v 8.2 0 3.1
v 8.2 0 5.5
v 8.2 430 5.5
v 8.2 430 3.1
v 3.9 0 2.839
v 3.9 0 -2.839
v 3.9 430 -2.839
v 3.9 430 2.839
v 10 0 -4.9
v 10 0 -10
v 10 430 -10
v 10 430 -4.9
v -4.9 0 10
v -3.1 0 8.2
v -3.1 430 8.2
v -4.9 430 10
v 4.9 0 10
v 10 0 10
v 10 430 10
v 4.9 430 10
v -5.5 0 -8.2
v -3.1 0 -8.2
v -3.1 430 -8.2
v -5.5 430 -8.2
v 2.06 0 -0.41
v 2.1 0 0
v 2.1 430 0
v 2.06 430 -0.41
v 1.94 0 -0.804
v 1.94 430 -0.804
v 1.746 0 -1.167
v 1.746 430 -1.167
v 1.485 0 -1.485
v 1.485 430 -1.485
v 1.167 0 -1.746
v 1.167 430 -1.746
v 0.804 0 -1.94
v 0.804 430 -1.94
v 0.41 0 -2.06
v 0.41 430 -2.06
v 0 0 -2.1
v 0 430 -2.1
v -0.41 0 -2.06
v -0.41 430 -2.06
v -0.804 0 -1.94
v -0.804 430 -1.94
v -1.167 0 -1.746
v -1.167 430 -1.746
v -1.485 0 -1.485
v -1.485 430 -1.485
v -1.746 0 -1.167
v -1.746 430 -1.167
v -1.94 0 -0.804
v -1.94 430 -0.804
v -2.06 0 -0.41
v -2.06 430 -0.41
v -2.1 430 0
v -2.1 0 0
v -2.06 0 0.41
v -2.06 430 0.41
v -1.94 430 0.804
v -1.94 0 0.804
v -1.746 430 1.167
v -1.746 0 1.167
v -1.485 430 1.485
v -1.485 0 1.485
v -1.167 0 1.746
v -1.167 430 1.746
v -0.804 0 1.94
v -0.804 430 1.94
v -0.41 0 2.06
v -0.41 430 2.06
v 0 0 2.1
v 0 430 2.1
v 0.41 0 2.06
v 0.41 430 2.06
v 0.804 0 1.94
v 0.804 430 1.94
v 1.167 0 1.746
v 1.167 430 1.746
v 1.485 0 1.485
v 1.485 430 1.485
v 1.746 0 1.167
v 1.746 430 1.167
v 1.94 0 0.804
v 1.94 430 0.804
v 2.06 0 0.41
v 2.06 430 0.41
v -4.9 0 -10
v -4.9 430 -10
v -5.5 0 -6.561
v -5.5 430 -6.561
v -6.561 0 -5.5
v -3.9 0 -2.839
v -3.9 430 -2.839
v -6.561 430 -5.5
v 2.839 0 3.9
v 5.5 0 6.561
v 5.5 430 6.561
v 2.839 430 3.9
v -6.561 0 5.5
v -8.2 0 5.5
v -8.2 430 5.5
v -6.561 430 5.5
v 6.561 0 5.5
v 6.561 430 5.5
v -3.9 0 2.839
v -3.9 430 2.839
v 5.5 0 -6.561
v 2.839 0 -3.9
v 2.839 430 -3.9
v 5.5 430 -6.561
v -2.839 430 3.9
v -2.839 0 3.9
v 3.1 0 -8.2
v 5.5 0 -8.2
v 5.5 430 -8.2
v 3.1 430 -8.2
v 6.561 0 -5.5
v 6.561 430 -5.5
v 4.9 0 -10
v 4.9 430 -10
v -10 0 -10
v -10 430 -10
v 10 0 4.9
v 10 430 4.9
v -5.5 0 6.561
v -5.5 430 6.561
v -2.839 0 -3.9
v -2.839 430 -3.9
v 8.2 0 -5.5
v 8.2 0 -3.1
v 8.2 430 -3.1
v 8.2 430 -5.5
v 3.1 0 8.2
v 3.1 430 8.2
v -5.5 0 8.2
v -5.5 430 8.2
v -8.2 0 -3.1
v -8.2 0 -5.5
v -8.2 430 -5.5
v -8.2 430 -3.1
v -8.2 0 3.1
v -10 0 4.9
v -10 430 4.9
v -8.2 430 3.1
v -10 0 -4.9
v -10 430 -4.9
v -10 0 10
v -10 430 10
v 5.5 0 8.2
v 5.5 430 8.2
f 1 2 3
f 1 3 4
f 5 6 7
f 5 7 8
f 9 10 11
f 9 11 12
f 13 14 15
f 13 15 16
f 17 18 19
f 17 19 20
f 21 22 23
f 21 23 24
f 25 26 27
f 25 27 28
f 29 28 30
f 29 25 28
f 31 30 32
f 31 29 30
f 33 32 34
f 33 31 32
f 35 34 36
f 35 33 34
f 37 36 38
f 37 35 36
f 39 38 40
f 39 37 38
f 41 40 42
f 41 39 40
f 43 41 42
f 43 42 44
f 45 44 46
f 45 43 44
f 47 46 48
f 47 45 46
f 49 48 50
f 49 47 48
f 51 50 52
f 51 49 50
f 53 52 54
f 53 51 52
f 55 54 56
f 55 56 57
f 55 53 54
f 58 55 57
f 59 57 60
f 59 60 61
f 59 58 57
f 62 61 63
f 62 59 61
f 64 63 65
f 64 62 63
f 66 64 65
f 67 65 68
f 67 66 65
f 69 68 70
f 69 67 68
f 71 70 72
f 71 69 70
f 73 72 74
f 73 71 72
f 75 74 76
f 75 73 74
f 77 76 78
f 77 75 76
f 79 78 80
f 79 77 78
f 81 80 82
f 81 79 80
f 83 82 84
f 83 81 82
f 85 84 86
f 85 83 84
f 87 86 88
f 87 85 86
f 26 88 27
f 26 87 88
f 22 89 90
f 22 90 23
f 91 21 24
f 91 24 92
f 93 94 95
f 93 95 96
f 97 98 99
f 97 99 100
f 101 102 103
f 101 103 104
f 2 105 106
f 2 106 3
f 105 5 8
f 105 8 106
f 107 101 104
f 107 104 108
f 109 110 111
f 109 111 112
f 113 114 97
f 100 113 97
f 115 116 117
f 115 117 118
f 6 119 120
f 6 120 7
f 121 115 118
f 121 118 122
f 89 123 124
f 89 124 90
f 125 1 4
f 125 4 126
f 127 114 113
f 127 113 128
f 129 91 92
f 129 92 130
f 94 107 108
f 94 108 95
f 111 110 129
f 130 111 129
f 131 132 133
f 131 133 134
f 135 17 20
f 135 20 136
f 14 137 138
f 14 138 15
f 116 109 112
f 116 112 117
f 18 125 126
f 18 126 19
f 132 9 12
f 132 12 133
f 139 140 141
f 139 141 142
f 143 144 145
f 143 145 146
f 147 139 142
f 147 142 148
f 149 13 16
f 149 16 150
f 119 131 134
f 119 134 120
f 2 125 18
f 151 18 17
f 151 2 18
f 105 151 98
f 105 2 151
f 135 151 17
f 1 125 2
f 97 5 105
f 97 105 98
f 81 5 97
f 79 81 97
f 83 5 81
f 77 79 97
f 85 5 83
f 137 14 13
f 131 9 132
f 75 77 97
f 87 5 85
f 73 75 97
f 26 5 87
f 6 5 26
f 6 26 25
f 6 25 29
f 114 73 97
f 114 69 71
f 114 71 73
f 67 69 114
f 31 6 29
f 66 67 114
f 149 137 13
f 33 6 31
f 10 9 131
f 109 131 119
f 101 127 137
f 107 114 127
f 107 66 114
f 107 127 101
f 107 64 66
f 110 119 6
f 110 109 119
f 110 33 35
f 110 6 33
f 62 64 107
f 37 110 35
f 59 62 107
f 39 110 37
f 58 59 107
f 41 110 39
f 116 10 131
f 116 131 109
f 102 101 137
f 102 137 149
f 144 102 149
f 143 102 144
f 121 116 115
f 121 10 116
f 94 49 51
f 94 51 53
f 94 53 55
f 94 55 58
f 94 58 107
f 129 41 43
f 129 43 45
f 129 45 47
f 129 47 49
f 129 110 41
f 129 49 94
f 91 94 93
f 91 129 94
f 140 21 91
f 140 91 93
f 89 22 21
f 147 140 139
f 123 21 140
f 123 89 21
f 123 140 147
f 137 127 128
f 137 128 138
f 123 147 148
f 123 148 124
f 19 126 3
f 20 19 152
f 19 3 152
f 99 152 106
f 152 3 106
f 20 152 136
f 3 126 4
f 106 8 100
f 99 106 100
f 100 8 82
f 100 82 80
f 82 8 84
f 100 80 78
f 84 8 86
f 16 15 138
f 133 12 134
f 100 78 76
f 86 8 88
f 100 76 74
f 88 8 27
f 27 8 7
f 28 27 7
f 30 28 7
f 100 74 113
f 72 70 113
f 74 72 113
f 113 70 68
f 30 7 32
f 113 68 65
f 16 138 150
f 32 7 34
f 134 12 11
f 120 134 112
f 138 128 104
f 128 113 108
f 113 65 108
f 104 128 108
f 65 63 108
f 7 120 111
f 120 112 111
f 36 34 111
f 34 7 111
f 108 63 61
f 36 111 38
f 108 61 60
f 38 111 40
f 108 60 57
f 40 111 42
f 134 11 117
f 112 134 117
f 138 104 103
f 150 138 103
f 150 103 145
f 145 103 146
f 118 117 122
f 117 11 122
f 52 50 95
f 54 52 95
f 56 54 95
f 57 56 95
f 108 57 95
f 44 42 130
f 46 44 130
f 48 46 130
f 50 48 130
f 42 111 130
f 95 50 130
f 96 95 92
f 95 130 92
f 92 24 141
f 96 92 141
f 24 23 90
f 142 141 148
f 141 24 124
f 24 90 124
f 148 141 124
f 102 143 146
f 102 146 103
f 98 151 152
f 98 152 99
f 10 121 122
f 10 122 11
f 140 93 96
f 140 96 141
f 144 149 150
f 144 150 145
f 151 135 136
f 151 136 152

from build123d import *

# Parameters (mm, degrees)
SKETCH_1_R      = 2.1
EXTRUDE_1_DEPTH = 430


with BuildPart() as part:
    # 草图1 → 凸台-拉伸1 (new body)
    with BuildSketch(Plane(origin=(0, 0, 0), x_dir=(1, 0, 0), z_dir=(0, 1, 0))):
        Polygon((-10, 10), (-4.9, 10), (-3.1, 8.2), (-5.5, 8.2), (-5.5, 6.560660172), (-2.839339828, 3.9), (0, 3.9), (2.839339828, 3.9), (5.5, 6.560660172), (5.5, 8.2), (3.1, 8.2), (4.9, 10), (10, 10), (10, 4.9), (8.2, 3.1), (8.2, 5.5), (6.560660172, 5.5), (3.9, 2.839339828), (3.9, -2.839339828), (6.560660172, -5.5), (8.2, -5.5), (8.2, -3.1), (10, -4.9), (10, -10), (4.9, -10), (3.1, -8.2), (5.5, -8.2), (5.5, -6.560660172), (2.839339828, -3.9), (0, -3.9), (-2.839339828, -3.9), (-5.5, -6.560660172), (-5.5, -8.2), (-3.1, -8.2), (-4.9, -10), (-10, -10), (-10, -4.9), (-8.2, -3.1), (-8.2, -5.5), (-6.560660172, -5.5), (-3.9, -2.839339828), (-3.9, 2.839339828), (-6.560660172, 5.5), (-8.2, 5.5), (-8.2, 3.1), (-10, 4.9), align=None)
        Circle(SKETCH_1_R, mode=Mode.SUBTRACT)
    extrude(amount=EXTRUDE_1_DEPTH)


solid = part.part
